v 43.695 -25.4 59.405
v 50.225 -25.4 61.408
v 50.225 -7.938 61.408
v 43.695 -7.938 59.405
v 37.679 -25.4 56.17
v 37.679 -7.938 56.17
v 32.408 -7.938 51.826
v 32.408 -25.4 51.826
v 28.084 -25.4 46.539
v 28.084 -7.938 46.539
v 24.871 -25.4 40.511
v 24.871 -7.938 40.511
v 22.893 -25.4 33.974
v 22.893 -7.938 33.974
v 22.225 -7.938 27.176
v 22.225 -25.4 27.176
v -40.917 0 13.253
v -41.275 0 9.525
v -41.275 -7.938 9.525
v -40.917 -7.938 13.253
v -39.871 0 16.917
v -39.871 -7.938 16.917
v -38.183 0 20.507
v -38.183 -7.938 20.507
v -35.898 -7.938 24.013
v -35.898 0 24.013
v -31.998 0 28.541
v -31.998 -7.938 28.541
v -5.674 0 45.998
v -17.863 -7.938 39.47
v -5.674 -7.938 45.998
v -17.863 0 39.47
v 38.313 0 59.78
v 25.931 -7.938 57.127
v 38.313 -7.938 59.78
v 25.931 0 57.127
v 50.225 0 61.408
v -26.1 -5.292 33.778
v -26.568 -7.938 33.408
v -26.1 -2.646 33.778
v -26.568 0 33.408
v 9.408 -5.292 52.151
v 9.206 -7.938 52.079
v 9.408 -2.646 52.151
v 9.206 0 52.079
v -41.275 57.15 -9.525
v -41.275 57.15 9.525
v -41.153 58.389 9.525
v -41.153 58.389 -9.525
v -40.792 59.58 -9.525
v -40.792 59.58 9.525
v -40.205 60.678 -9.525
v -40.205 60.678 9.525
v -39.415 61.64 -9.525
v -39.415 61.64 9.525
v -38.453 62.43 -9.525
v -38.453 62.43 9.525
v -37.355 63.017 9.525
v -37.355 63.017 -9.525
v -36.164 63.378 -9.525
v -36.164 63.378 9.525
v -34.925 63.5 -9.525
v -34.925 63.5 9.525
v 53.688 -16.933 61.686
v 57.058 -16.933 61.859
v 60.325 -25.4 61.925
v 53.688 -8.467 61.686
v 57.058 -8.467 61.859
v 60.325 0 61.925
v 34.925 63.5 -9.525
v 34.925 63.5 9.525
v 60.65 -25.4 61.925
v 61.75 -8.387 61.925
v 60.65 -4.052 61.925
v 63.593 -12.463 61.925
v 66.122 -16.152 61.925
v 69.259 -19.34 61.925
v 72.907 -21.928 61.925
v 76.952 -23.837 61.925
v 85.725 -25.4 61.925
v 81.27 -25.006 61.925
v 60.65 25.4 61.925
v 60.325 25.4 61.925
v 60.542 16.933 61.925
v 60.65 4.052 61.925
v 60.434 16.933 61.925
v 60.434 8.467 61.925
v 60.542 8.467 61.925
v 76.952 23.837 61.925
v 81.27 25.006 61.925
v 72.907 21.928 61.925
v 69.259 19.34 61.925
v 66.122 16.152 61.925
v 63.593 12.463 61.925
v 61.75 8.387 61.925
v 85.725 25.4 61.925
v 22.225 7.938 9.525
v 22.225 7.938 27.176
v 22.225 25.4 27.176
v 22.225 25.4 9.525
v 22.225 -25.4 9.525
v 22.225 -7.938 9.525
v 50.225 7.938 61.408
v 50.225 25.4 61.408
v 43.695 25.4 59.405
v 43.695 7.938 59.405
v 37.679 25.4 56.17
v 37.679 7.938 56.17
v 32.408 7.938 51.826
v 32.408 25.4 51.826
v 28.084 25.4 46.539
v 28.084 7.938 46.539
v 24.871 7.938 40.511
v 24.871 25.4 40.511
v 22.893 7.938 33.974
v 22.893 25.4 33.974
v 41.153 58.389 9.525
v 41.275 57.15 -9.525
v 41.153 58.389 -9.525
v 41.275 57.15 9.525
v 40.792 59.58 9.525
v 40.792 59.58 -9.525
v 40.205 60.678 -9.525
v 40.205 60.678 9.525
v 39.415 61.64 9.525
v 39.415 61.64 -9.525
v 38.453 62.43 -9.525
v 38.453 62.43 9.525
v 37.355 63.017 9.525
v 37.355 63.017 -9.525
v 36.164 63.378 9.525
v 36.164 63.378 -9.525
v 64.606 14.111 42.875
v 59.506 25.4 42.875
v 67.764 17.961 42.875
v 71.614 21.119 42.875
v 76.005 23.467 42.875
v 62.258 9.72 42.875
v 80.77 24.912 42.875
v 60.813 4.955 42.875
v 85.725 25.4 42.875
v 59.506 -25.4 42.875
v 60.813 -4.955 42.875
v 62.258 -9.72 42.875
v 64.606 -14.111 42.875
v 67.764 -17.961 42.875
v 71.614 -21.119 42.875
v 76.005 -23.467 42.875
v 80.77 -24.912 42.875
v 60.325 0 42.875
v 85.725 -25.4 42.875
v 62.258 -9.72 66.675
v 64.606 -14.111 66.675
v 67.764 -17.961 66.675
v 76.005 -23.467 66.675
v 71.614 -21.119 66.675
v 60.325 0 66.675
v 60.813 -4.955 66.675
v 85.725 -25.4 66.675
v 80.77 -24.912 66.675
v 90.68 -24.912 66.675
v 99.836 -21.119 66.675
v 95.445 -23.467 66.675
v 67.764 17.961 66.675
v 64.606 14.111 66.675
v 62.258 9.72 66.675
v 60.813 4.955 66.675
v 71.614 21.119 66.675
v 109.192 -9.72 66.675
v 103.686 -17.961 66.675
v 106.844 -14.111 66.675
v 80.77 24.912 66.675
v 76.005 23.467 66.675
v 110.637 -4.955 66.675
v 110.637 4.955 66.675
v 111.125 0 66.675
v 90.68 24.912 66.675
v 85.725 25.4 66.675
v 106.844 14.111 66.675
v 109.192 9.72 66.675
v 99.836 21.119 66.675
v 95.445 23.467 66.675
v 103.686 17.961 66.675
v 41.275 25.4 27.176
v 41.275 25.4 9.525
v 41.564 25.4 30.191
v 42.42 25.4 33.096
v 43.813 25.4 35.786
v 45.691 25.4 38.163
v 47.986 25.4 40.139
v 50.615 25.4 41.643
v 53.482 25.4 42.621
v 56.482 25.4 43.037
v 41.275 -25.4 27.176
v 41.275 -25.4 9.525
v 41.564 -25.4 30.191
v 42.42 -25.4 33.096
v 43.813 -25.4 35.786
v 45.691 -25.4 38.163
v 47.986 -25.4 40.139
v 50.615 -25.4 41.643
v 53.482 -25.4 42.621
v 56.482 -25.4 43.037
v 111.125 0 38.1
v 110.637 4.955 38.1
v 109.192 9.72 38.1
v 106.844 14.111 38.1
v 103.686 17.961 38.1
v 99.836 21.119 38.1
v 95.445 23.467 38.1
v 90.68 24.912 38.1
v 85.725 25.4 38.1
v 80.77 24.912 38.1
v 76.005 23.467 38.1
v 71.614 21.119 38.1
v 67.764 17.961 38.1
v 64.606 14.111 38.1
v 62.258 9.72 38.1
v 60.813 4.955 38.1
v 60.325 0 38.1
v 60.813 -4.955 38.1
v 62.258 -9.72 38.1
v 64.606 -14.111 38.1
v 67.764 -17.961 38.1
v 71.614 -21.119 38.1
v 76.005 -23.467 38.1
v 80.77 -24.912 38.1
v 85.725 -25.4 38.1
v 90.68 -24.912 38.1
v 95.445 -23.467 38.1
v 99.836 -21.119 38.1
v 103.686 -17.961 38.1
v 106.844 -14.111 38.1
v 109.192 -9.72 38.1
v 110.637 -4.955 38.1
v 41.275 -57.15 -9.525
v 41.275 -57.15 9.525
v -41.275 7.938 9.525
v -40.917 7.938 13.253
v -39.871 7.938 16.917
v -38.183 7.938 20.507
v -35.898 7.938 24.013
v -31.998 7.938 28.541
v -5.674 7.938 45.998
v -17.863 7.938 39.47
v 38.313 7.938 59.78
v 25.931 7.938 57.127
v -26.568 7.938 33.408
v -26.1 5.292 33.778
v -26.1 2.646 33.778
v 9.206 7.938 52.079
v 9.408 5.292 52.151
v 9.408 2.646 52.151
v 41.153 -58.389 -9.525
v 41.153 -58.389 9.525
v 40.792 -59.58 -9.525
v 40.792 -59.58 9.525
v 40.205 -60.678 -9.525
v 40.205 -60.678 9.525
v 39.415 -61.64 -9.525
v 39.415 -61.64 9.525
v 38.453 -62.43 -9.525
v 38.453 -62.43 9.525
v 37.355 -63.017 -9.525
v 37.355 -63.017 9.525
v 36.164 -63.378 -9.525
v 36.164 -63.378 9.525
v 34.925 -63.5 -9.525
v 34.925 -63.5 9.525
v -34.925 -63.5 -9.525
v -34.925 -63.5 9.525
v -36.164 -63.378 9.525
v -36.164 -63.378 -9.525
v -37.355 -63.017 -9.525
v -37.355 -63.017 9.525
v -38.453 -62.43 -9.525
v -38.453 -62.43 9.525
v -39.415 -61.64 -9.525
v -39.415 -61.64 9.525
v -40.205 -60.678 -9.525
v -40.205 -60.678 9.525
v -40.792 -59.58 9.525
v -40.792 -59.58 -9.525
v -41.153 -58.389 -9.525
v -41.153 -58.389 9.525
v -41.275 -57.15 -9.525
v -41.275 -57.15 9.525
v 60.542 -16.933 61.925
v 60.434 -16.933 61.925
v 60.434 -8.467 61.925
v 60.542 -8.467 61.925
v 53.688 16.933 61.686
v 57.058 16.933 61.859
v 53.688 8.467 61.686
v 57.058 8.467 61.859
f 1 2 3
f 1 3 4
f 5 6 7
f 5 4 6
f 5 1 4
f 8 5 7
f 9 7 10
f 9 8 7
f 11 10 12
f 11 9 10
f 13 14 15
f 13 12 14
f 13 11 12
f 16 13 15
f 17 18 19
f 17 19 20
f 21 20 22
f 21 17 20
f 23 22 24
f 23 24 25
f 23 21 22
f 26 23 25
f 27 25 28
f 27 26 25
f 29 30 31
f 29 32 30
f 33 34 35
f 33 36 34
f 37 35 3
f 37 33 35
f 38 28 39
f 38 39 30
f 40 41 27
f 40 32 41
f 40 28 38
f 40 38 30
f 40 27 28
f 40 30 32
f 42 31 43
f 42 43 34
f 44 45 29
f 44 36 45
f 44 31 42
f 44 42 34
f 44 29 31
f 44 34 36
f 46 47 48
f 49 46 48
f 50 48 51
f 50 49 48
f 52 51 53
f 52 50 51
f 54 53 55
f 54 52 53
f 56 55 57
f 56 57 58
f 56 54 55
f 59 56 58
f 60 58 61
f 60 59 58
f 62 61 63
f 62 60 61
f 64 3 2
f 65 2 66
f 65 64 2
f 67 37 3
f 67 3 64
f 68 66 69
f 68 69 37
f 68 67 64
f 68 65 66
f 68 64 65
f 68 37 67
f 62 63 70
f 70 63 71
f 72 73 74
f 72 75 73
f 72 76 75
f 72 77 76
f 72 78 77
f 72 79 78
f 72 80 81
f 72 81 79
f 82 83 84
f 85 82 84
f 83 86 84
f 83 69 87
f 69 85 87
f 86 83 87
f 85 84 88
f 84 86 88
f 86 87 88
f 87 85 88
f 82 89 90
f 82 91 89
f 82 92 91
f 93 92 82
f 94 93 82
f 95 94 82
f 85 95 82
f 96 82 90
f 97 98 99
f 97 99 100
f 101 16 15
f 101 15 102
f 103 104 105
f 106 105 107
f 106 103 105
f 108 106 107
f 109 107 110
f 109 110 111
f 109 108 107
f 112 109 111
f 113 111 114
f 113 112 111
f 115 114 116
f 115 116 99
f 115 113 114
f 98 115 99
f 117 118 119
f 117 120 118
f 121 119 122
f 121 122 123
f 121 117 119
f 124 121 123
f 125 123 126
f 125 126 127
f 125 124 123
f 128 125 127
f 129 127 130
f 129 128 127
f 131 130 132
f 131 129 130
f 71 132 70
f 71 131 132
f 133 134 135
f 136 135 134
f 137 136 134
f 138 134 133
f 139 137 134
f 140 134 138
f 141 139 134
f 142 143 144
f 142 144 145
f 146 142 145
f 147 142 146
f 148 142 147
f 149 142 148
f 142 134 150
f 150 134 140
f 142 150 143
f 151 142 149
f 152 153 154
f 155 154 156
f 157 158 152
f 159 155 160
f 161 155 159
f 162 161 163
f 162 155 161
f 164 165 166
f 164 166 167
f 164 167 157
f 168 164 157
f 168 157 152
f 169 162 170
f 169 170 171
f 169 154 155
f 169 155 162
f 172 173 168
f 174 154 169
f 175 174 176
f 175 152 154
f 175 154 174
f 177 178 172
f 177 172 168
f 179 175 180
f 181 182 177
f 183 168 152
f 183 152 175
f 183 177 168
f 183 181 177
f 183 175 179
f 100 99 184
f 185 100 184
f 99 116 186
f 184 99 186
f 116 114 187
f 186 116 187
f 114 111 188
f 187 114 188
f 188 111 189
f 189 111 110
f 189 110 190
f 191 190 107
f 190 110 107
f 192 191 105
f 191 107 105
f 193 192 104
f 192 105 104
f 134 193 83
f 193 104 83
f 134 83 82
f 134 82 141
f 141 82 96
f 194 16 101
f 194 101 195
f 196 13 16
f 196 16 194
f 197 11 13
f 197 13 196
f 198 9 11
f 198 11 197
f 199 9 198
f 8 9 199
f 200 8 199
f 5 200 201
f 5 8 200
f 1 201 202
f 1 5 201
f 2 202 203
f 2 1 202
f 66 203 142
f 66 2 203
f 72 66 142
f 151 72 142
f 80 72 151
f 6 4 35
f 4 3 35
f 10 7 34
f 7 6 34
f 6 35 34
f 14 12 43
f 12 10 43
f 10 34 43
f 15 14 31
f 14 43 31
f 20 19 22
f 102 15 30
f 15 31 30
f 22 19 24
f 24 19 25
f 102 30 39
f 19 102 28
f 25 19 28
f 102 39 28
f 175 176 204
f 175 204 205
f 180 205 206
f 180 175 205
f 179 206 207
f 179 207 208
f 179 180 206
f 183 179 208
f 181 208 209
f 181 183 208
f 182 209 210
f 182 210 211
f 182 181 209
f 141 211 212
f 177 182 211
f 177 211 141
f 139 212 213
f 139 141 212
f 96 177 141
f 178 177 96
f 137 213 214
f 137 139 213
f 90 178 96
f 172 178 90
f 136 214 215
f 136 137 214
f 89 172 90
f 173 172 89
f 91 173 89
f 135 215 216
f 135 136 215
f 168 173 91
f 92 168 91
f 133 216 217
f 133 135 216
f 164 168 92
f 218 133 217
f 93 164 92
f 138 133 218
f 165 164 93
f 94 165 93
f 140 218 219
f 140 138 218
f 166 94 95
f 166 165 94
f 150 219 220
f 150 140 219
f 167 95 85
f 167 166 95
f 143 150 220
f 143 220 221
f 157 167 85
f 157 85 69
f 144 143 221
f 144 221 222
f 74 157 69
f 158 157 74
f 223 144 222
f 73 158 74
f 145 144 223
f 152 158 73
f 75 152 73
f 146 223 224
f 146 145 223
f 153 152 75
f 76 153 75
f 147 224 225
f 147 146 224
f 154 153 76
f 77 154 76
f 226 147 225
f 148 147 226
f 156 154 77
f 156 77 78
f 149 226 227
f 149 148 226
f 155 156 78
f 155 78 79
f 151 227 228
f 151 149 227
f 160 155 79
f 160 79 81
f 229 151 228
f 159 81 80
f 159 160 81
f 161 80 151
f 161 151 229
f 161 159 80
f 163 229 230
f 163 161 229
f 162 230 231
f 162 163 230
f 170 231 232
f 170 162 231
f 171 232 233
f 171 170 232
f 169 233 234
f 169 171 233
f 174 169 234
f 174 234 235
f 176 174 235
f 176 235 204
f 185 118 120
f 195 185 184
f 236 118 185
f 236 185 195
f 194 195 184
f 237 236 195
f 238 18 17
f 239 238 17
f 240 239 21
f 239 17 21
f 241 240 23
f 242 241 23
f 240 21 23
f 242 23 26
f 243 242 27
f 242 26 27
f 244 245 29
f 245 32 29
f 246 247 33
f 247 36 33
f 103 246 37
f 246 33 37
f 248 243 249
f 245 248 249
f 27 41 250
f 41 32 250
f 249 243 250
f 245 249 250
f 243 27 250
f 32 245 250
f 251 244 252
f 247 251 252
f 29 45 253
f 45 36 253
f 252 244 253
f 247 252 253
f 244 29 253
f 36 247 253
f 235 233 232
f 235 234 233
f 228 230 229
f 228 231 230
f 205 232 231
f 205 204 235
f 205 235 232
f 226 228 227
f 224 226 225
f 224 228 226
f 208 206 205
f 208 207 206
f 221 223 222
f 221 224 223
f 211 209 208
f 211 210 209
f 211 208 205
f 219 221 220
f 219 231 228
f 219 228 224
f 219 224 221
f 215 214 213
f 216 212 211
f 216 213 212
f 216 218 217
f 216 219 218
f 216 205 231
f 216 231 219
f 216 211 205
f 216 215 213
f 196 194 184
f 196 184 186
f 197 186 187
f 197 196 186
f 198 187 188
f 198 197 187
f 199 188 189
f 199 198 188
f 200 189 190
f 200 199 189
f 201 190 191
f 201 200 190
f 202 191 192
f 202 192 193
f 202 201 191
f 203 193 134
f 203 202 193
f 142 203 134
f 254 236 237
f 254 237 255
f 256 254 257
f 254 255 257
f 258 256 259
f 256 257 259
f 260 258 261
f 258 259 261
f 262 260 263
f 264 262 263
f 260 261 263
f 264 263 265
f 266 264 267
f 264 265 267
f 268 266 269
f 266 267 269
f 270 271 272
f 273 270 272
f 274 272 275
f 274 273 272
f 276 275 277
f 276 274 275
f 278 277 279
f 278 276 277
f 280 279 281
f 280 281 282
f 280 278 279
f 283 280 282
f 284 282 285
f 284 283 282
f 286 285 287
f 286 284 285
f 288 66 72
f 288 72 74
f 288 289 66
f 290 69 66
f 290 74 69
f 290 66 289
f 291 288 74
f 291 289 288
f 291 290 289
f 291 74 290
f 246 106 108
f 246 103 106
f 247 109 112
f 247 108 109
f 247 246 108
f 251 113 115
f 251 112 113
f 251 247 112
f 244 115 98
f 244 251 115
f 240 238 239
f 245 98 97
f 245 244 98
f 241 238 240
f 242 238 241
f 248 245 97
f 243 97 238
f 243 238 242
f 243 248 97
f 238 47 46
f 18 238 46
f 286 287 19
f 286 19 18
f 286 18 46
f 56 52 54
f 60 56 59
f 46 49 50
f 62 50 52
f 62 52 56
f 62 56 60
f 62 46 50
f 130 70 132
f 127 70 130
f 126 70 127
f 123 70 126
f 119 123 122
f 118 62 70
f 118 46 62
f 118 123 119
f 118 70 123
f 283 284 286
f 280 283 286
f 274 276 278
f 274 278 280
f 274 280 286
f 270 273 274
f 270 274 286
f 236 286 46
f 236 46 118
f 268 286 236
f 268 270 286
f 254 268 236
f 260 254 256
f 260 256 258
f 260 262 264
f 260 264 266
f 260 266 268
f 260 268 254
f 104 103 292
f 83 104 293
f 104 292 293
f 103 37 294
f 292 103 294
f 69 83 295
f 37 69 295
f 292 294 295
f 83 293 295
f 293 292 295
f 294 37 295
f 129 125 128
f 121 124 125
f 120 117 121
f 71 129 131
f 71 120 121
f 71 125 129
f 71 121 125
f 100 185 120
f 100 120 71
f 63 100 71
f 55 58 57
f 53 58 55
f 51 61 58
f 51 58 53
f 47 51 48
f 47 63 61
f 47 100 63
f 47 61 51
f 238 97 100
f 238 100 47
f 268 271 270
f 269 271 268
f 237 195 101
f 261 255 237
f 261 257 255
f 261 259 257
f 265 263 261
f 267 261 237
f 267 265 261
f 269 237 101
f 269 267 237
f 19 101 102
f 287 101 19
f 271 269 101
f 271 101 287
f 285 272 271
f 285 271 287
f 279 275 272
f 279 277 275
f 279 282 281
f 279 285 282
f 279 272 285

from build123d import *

# Parameters (mm, degrees)
F1_DEPTH = 63.5
F2_DEPTH = 25.4
F3_DEPTH = 7.9375
F5_R     = 6.35


with BuildPart() as f1:
    # F0 (on Front) → F1 (new body, symmetric)
    with BuildSketch(Plane.XZ):
        Polygon((22.225, 9.525), (-41.275, 9.525), (-41.275, -9.525), (41.275, -9.525), (41.275, 9.525), align=None)
    extrude(amount=F1_DEPTH, both=True)

    # F0 (on Front) → F2 (join, symmetric)
    with BuildSketch(Plane.XZ):
        with BuildLine():
            Line((22.225, 27.176042), (22.225, 9.525))
            Line((22.225, 9.525), (41.275, 9.525))
            Line((41.275, 9.525), (41.275, 27.176042))
            ThreePointArc((41.275, 27.176042), (46.791196, 39.205623), (59.506283, 42.8752))
            Line((59.506283, 42.8752), (60.325, 42.8752))
            Line((60.325, 42.8752), (60.325, 61.924634))
            add(Edge.make_bspline(
                [(50.225098, 61.407626), (53.729785, 61.737464), (57.113469, 61.913471), (60.325, 61.924634)],
                knots=[104.739527, 104.739527, 104.739527, 104.739527, 114.283242, 114.283242, 114.283242, 114.283242], degree=3))
            ThreePointArc((50.225098, 61.407626), (30.116615, 49.288295), (22.225, 27.176042))
        make_face()
        with BuildLine():
            add(Edge.make_bspline(
                [(60.325, 61.924634), (60.43361, 61.925011), (60.542023, 61.9252), (60.650237, 61.9252)],
                knots=[114.283242, 114.283242, 114.283242, 114.283242, 114.605999, 114.605999, 114.605999, 114.605999], degree=3))
            Line((60.325, 61.924634), (60.325, 42.8752))
            Line((60.325, 42.8752), (85.725, 42.8752))
            Line((85.725, 42.8752), (85.725, 61.9252))
            Line((85.725, 61.9252), (60.650237, 61.9252))
        make_face()
    extrude(amount=F2_DEPTH, both=True)

    # F0 (on Front) → F3 (join, symmetric)
    with BuildSketch(Plane.XZ):
        with BuildLine():
            add(Edge.make_bspline(
                [(-41.275, 9.525), (-41.275, 35.639968), (11.762158, 57.787757), (50.225098, 61.407626)],
                knots=[0, 0, 0, 0, 104.739527, 104.739527, 104.739527, 104.739527], degree=3))
            Line((-41.275, 9.525), (22.225, 9.525))
            Line((22.225, 9.525), (22.225, 27.176042))
            ThreePointArc((22.225, 27.176042), (30.116615, 49.288295), (50.225098, 61.407626))
        make_face()
    extrude(amount=F3_DEPTH, both=True)

    # F0 (on Front) → F4 (revolve)
    with BuildSketch(Plane.XZ):
        Polygon((111.125, 66.675), (85.725, 66.675), (85.725, 61.9252), (85.725, 42.8752), (85.725, 38.1), (111.125, 38.1), align=None)
    revolve(axis=Axis((85.725, 0, 52.3875), (0, 0, 1)))

    # F5
    f5_edges = [f1.edges().sort_by_distance(p)[0] for p in [
        (41.275, -63.5, 0),
        (-41.275, -63.5, 0),
        (41.275, 63.5, 0),
        (-41.275, 63.5, 0),
    ]]
    fillet(f5_edges, radius=F5_R)


solid = f1.part
